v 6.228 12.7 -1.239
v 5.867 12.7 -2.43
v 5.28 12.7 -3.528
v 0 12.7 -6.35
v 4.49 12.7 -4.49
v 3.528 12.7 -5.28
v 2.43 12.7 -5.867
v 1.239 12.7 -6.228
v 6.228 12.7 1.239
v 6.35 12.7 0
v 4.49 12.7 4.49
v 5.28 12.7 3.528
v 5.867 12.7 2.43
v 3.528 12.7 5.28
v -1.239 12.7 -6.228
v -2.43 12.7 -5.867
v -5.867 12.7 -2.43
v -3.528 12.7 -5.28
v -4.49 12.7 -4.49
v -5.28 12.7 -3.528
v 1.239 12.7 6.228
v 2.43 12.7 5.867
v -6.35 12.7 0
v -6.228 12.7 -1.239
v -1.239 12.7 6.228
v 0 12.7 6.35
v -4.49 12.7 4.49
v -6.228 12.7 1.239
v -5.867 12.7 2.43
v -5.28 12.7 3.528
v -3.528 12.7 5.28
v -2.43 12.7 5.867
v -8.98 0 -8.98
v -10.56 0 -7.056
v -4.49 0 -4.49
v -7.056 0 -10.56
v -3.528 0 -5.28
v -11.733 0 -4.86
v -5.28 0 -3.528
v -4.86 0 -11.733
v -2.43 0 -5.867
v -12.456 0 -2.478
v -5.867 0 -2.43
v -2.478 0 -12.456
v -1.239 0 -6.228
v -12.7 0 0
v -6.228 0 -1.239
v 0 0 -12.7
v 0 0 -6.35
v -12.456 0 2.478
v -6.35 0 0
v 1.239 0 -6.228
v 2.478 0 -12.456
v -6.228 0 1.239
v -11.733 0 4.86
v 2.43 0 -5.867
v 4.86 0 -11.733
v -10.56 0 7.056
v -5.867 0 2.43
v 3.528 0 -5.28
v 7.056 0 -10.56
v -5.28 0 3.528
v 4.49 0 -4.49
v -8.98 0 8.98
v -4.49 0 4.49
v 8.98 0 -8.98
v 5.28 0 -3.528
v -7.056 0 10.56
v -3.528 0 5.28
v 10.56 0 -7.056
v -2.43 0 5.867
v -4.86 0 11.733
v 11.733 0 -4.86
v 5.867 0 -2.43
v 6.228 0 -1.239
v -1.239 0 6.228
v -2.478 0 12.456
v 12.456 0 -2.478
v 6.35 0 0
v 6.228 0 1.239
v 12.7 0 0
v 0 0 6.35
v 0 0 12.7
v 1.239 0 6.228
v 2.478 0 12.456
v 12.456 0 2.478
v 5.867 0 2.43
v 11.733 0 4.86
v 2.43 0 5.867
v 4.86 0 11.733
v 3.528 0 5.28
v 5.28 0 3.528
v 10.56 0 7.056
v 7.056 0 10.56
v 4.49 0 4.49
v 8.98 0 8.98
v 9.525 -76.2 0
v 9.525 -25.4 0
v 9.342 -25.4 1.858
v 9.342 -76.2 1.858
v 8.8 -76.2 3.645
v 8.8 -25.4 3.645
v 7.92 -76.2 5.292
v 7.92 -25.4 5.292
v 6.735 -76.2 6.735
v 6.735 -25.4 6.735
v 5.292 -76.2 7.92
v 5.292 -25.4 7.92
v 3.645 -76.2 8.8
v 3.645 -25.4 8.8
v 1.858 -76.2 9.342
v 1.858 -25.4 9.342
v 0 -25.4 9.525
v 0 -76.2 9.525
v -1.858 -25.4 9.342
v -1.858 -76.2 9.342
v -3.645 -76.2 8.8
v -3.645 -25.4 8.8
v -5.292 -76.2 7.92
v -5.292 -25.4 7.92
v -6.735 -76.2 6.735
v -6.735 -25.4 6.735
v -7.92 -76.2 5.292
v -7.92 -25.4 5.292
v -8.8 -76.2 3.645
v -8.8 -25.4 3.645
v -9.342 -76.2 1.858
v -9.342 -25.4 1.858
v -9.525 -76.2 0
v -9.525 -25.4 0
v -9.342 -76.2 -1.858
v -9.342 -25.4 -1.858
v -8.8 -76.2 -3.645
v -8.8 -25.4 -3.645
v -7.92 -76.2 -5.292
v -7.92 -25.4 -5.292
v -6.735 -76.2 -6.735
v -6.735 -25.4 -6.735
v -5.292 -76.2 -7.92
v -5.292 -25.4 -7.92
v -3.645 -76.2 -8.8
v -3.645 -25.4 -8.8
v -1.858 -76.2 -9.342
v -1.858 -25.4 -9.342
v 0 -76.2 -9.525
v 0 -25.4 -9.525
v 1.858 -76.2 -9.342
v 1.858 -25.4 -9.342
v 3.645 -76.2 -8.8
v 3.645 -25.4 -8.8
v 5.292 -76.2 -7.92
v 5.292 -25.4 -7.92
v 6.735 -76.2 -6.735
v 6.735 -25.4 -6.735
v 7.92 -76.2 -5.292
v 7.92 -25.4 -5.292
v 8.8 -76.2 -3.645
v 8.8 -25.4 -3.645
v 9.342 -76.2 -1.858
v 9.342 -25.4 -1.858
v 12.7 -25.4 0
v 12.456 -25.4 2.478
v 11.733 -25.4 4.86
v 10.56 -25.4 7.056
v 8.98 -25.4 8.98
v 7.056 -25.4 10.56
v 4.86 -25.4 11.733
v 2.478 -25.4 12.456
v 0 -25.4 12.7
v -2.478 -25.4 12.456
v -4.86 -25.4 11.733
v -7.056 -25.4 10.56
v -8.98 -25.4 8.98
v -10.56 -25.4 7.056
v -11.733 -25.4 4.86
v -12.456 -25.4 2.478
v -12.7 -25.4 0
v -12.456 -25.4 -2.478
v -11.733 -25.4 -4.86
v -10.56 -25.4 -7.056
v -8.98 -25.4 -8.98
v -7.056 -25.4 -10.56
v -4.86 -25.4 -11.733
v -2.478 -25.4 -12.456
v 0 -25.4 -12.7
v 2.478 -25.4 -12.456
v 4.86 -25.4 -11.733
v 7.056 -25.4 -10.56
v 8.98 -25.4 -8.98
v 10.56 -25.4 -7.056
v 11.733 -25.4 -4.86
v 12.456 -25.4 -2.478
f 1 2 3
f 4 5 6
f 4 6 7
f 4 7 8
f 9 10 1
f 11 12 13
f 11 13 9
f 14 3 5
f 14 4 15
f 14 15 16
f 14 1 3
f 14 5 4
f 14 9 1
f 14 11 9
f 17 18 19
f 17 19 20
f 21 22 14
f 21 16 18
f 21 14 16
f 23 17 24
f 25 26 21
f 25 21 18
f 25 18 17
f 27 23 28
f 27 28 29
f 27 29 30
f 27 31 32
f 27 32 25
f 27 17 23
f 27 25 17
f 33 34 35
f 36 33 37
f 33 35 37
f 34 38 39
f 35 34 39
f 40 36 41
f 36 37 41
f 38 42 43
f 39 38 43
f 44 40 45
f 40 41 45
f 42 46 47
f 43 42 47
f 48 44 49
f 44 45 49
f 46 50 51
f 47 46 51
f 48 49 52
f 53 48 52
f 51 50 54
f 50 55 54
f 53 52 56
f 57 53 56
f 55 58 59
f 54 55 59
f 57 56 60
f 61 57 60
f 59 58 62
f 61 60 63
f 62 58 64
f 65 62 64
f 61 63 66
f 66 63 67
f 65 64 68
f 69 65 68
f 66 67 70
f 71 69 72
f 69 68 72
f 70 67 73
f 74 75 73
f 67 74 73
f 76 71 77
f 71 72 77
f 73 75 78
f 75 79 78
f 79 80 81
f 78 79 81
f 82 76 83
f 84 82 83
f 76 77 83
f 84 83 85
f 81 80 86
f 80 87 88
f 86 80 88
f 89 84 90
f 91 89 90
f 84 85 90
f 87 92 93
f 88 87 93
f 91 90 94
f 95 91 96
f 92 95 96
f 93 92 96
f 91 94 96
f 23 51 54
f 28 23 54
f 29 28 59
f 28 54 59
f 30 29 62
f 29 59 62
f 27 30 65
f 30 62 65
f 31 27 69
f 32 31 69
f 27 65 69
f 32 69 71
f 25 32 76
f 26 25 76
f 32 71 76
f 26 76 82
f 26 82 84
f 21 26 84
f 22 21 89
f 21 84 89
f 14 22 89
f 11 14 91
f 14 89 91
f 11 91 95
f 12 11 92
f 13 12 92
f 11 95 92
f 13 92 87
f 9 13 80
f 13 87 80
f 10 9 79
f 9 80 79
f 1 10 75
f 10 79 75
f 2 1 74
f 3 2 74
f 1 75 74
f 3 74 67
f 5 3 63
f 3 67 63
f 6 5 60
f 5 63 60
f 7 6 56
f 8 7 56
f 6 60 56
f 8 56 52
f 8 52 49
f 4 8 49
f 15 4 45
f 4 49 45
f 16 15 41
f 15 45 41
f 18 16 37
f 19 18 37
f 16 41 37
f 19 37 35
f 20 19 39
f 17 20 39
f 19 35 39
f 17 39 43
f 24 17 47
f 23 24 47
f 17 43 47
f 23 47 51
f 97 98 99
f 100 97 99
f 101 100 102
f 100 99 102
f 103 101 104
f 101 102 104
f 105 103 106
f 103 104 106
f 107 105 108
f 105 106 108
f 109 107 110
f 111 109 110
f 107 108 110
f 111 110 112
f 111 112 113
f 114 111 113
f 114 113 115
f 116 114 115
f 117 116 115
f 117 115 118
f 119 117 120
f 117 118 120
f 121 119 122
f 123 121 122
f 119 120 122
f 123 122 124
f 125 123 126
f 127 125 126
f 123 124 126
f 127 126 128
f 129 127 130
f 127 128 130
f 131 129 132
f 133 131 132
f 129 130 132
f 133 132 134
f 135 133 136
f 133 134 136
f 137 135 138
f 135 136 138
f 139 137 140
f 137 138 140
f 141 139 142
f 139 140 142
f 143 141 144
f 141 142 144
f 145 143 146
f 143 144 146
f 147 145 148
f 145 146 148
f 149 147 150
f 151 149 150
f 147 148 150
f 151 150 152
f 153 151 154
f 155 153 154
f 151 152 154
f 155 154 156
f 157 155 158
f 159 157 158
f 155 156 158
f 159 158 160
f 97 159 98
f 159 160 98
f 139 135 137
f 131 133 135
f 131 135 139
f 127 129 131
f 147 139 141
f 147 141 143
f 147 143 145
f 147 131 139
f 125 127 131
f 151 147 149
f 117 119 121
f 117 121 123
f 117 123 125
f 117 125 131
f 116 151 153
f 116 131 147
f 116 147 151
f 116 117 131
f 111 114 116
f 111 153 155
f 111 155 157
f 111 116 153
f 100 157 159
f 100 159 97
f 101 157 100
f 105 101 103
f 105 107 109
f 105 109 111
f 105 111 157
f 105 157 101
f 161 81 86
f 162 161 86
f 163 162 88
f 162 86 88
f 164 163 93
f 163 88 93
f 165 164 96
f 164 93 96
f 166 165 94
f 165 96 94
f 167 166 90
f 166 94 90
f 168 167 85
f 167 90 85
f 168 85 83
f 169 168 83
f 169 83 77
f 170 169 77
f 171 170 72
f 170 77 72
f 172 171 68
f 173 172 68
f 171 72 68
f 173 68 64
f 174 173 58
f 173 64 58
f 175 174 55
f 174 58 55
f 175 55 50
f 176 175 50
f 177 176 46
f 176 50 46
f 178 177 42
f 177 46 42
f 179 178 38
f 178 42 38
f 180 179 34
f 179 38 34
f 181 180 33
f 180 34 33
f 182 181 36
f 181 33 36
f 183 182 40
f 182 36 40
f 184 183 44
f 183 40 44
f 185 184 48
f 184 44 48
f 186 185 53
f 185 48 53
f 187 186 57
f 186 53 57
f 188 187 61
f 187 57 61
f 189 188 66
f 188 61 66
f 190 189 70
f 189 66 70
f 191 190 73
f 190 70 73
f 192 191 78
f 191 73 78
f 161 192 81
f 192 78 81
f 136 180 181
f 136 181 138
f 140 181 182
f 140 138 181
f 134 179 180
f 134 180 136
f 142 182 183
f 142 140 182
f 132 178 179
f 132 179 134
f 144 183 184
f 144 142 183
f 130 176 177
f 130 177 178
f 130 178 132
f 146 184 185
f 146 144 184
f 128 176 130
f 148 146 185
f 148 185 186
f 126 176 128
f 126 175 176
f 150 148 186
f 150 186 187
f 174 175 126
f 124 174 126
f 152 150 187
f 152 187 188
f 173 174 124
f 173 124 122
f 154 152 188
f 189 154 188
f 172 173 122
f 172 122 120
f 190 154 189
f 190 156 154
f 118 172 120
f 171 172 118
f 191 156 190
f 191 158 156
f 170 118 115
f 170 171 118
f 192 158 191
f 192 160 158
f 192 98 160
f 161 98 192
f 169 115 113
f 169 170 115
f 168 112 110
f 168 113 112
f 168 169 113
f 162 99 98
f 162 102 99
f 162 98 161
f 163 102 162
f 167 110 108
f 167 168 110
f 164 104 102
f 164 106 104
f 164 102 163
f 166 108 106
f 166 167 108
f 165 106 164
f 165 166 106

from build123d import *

# Parameters (mm, degrees)
F0_R     = 12.7
F1_DEPTH = 25.4
F2_R     = 6.35
F3_DEPTH = 12.7
F4_R     = 9.525
F5_DEPTH = 50.8


with BuildPart() as f1:
    # F0 (on Front) → F1 (new body)
    with BuildSketch(Plane.XZ):
        Circle(F0_R)
    extrude(amount=F1_DEPTH)

    # F2 (on face) → F3 (join)
    with BuildSketch(Plane(origin=(0, 0, 0), x_dir=(-1, 0, 0), z_dir=(0, 1, 0))):
        Circle(F2_R)
    extrude(amount=F3_DEPTH)

    # F4 (on face) → F5 (join)
    with BuildSketch(Plane.XZ.offset(25.4)):
        Circle(F4_R)
    extrude(amount=F5_DEPTH)


solid = f1.part
